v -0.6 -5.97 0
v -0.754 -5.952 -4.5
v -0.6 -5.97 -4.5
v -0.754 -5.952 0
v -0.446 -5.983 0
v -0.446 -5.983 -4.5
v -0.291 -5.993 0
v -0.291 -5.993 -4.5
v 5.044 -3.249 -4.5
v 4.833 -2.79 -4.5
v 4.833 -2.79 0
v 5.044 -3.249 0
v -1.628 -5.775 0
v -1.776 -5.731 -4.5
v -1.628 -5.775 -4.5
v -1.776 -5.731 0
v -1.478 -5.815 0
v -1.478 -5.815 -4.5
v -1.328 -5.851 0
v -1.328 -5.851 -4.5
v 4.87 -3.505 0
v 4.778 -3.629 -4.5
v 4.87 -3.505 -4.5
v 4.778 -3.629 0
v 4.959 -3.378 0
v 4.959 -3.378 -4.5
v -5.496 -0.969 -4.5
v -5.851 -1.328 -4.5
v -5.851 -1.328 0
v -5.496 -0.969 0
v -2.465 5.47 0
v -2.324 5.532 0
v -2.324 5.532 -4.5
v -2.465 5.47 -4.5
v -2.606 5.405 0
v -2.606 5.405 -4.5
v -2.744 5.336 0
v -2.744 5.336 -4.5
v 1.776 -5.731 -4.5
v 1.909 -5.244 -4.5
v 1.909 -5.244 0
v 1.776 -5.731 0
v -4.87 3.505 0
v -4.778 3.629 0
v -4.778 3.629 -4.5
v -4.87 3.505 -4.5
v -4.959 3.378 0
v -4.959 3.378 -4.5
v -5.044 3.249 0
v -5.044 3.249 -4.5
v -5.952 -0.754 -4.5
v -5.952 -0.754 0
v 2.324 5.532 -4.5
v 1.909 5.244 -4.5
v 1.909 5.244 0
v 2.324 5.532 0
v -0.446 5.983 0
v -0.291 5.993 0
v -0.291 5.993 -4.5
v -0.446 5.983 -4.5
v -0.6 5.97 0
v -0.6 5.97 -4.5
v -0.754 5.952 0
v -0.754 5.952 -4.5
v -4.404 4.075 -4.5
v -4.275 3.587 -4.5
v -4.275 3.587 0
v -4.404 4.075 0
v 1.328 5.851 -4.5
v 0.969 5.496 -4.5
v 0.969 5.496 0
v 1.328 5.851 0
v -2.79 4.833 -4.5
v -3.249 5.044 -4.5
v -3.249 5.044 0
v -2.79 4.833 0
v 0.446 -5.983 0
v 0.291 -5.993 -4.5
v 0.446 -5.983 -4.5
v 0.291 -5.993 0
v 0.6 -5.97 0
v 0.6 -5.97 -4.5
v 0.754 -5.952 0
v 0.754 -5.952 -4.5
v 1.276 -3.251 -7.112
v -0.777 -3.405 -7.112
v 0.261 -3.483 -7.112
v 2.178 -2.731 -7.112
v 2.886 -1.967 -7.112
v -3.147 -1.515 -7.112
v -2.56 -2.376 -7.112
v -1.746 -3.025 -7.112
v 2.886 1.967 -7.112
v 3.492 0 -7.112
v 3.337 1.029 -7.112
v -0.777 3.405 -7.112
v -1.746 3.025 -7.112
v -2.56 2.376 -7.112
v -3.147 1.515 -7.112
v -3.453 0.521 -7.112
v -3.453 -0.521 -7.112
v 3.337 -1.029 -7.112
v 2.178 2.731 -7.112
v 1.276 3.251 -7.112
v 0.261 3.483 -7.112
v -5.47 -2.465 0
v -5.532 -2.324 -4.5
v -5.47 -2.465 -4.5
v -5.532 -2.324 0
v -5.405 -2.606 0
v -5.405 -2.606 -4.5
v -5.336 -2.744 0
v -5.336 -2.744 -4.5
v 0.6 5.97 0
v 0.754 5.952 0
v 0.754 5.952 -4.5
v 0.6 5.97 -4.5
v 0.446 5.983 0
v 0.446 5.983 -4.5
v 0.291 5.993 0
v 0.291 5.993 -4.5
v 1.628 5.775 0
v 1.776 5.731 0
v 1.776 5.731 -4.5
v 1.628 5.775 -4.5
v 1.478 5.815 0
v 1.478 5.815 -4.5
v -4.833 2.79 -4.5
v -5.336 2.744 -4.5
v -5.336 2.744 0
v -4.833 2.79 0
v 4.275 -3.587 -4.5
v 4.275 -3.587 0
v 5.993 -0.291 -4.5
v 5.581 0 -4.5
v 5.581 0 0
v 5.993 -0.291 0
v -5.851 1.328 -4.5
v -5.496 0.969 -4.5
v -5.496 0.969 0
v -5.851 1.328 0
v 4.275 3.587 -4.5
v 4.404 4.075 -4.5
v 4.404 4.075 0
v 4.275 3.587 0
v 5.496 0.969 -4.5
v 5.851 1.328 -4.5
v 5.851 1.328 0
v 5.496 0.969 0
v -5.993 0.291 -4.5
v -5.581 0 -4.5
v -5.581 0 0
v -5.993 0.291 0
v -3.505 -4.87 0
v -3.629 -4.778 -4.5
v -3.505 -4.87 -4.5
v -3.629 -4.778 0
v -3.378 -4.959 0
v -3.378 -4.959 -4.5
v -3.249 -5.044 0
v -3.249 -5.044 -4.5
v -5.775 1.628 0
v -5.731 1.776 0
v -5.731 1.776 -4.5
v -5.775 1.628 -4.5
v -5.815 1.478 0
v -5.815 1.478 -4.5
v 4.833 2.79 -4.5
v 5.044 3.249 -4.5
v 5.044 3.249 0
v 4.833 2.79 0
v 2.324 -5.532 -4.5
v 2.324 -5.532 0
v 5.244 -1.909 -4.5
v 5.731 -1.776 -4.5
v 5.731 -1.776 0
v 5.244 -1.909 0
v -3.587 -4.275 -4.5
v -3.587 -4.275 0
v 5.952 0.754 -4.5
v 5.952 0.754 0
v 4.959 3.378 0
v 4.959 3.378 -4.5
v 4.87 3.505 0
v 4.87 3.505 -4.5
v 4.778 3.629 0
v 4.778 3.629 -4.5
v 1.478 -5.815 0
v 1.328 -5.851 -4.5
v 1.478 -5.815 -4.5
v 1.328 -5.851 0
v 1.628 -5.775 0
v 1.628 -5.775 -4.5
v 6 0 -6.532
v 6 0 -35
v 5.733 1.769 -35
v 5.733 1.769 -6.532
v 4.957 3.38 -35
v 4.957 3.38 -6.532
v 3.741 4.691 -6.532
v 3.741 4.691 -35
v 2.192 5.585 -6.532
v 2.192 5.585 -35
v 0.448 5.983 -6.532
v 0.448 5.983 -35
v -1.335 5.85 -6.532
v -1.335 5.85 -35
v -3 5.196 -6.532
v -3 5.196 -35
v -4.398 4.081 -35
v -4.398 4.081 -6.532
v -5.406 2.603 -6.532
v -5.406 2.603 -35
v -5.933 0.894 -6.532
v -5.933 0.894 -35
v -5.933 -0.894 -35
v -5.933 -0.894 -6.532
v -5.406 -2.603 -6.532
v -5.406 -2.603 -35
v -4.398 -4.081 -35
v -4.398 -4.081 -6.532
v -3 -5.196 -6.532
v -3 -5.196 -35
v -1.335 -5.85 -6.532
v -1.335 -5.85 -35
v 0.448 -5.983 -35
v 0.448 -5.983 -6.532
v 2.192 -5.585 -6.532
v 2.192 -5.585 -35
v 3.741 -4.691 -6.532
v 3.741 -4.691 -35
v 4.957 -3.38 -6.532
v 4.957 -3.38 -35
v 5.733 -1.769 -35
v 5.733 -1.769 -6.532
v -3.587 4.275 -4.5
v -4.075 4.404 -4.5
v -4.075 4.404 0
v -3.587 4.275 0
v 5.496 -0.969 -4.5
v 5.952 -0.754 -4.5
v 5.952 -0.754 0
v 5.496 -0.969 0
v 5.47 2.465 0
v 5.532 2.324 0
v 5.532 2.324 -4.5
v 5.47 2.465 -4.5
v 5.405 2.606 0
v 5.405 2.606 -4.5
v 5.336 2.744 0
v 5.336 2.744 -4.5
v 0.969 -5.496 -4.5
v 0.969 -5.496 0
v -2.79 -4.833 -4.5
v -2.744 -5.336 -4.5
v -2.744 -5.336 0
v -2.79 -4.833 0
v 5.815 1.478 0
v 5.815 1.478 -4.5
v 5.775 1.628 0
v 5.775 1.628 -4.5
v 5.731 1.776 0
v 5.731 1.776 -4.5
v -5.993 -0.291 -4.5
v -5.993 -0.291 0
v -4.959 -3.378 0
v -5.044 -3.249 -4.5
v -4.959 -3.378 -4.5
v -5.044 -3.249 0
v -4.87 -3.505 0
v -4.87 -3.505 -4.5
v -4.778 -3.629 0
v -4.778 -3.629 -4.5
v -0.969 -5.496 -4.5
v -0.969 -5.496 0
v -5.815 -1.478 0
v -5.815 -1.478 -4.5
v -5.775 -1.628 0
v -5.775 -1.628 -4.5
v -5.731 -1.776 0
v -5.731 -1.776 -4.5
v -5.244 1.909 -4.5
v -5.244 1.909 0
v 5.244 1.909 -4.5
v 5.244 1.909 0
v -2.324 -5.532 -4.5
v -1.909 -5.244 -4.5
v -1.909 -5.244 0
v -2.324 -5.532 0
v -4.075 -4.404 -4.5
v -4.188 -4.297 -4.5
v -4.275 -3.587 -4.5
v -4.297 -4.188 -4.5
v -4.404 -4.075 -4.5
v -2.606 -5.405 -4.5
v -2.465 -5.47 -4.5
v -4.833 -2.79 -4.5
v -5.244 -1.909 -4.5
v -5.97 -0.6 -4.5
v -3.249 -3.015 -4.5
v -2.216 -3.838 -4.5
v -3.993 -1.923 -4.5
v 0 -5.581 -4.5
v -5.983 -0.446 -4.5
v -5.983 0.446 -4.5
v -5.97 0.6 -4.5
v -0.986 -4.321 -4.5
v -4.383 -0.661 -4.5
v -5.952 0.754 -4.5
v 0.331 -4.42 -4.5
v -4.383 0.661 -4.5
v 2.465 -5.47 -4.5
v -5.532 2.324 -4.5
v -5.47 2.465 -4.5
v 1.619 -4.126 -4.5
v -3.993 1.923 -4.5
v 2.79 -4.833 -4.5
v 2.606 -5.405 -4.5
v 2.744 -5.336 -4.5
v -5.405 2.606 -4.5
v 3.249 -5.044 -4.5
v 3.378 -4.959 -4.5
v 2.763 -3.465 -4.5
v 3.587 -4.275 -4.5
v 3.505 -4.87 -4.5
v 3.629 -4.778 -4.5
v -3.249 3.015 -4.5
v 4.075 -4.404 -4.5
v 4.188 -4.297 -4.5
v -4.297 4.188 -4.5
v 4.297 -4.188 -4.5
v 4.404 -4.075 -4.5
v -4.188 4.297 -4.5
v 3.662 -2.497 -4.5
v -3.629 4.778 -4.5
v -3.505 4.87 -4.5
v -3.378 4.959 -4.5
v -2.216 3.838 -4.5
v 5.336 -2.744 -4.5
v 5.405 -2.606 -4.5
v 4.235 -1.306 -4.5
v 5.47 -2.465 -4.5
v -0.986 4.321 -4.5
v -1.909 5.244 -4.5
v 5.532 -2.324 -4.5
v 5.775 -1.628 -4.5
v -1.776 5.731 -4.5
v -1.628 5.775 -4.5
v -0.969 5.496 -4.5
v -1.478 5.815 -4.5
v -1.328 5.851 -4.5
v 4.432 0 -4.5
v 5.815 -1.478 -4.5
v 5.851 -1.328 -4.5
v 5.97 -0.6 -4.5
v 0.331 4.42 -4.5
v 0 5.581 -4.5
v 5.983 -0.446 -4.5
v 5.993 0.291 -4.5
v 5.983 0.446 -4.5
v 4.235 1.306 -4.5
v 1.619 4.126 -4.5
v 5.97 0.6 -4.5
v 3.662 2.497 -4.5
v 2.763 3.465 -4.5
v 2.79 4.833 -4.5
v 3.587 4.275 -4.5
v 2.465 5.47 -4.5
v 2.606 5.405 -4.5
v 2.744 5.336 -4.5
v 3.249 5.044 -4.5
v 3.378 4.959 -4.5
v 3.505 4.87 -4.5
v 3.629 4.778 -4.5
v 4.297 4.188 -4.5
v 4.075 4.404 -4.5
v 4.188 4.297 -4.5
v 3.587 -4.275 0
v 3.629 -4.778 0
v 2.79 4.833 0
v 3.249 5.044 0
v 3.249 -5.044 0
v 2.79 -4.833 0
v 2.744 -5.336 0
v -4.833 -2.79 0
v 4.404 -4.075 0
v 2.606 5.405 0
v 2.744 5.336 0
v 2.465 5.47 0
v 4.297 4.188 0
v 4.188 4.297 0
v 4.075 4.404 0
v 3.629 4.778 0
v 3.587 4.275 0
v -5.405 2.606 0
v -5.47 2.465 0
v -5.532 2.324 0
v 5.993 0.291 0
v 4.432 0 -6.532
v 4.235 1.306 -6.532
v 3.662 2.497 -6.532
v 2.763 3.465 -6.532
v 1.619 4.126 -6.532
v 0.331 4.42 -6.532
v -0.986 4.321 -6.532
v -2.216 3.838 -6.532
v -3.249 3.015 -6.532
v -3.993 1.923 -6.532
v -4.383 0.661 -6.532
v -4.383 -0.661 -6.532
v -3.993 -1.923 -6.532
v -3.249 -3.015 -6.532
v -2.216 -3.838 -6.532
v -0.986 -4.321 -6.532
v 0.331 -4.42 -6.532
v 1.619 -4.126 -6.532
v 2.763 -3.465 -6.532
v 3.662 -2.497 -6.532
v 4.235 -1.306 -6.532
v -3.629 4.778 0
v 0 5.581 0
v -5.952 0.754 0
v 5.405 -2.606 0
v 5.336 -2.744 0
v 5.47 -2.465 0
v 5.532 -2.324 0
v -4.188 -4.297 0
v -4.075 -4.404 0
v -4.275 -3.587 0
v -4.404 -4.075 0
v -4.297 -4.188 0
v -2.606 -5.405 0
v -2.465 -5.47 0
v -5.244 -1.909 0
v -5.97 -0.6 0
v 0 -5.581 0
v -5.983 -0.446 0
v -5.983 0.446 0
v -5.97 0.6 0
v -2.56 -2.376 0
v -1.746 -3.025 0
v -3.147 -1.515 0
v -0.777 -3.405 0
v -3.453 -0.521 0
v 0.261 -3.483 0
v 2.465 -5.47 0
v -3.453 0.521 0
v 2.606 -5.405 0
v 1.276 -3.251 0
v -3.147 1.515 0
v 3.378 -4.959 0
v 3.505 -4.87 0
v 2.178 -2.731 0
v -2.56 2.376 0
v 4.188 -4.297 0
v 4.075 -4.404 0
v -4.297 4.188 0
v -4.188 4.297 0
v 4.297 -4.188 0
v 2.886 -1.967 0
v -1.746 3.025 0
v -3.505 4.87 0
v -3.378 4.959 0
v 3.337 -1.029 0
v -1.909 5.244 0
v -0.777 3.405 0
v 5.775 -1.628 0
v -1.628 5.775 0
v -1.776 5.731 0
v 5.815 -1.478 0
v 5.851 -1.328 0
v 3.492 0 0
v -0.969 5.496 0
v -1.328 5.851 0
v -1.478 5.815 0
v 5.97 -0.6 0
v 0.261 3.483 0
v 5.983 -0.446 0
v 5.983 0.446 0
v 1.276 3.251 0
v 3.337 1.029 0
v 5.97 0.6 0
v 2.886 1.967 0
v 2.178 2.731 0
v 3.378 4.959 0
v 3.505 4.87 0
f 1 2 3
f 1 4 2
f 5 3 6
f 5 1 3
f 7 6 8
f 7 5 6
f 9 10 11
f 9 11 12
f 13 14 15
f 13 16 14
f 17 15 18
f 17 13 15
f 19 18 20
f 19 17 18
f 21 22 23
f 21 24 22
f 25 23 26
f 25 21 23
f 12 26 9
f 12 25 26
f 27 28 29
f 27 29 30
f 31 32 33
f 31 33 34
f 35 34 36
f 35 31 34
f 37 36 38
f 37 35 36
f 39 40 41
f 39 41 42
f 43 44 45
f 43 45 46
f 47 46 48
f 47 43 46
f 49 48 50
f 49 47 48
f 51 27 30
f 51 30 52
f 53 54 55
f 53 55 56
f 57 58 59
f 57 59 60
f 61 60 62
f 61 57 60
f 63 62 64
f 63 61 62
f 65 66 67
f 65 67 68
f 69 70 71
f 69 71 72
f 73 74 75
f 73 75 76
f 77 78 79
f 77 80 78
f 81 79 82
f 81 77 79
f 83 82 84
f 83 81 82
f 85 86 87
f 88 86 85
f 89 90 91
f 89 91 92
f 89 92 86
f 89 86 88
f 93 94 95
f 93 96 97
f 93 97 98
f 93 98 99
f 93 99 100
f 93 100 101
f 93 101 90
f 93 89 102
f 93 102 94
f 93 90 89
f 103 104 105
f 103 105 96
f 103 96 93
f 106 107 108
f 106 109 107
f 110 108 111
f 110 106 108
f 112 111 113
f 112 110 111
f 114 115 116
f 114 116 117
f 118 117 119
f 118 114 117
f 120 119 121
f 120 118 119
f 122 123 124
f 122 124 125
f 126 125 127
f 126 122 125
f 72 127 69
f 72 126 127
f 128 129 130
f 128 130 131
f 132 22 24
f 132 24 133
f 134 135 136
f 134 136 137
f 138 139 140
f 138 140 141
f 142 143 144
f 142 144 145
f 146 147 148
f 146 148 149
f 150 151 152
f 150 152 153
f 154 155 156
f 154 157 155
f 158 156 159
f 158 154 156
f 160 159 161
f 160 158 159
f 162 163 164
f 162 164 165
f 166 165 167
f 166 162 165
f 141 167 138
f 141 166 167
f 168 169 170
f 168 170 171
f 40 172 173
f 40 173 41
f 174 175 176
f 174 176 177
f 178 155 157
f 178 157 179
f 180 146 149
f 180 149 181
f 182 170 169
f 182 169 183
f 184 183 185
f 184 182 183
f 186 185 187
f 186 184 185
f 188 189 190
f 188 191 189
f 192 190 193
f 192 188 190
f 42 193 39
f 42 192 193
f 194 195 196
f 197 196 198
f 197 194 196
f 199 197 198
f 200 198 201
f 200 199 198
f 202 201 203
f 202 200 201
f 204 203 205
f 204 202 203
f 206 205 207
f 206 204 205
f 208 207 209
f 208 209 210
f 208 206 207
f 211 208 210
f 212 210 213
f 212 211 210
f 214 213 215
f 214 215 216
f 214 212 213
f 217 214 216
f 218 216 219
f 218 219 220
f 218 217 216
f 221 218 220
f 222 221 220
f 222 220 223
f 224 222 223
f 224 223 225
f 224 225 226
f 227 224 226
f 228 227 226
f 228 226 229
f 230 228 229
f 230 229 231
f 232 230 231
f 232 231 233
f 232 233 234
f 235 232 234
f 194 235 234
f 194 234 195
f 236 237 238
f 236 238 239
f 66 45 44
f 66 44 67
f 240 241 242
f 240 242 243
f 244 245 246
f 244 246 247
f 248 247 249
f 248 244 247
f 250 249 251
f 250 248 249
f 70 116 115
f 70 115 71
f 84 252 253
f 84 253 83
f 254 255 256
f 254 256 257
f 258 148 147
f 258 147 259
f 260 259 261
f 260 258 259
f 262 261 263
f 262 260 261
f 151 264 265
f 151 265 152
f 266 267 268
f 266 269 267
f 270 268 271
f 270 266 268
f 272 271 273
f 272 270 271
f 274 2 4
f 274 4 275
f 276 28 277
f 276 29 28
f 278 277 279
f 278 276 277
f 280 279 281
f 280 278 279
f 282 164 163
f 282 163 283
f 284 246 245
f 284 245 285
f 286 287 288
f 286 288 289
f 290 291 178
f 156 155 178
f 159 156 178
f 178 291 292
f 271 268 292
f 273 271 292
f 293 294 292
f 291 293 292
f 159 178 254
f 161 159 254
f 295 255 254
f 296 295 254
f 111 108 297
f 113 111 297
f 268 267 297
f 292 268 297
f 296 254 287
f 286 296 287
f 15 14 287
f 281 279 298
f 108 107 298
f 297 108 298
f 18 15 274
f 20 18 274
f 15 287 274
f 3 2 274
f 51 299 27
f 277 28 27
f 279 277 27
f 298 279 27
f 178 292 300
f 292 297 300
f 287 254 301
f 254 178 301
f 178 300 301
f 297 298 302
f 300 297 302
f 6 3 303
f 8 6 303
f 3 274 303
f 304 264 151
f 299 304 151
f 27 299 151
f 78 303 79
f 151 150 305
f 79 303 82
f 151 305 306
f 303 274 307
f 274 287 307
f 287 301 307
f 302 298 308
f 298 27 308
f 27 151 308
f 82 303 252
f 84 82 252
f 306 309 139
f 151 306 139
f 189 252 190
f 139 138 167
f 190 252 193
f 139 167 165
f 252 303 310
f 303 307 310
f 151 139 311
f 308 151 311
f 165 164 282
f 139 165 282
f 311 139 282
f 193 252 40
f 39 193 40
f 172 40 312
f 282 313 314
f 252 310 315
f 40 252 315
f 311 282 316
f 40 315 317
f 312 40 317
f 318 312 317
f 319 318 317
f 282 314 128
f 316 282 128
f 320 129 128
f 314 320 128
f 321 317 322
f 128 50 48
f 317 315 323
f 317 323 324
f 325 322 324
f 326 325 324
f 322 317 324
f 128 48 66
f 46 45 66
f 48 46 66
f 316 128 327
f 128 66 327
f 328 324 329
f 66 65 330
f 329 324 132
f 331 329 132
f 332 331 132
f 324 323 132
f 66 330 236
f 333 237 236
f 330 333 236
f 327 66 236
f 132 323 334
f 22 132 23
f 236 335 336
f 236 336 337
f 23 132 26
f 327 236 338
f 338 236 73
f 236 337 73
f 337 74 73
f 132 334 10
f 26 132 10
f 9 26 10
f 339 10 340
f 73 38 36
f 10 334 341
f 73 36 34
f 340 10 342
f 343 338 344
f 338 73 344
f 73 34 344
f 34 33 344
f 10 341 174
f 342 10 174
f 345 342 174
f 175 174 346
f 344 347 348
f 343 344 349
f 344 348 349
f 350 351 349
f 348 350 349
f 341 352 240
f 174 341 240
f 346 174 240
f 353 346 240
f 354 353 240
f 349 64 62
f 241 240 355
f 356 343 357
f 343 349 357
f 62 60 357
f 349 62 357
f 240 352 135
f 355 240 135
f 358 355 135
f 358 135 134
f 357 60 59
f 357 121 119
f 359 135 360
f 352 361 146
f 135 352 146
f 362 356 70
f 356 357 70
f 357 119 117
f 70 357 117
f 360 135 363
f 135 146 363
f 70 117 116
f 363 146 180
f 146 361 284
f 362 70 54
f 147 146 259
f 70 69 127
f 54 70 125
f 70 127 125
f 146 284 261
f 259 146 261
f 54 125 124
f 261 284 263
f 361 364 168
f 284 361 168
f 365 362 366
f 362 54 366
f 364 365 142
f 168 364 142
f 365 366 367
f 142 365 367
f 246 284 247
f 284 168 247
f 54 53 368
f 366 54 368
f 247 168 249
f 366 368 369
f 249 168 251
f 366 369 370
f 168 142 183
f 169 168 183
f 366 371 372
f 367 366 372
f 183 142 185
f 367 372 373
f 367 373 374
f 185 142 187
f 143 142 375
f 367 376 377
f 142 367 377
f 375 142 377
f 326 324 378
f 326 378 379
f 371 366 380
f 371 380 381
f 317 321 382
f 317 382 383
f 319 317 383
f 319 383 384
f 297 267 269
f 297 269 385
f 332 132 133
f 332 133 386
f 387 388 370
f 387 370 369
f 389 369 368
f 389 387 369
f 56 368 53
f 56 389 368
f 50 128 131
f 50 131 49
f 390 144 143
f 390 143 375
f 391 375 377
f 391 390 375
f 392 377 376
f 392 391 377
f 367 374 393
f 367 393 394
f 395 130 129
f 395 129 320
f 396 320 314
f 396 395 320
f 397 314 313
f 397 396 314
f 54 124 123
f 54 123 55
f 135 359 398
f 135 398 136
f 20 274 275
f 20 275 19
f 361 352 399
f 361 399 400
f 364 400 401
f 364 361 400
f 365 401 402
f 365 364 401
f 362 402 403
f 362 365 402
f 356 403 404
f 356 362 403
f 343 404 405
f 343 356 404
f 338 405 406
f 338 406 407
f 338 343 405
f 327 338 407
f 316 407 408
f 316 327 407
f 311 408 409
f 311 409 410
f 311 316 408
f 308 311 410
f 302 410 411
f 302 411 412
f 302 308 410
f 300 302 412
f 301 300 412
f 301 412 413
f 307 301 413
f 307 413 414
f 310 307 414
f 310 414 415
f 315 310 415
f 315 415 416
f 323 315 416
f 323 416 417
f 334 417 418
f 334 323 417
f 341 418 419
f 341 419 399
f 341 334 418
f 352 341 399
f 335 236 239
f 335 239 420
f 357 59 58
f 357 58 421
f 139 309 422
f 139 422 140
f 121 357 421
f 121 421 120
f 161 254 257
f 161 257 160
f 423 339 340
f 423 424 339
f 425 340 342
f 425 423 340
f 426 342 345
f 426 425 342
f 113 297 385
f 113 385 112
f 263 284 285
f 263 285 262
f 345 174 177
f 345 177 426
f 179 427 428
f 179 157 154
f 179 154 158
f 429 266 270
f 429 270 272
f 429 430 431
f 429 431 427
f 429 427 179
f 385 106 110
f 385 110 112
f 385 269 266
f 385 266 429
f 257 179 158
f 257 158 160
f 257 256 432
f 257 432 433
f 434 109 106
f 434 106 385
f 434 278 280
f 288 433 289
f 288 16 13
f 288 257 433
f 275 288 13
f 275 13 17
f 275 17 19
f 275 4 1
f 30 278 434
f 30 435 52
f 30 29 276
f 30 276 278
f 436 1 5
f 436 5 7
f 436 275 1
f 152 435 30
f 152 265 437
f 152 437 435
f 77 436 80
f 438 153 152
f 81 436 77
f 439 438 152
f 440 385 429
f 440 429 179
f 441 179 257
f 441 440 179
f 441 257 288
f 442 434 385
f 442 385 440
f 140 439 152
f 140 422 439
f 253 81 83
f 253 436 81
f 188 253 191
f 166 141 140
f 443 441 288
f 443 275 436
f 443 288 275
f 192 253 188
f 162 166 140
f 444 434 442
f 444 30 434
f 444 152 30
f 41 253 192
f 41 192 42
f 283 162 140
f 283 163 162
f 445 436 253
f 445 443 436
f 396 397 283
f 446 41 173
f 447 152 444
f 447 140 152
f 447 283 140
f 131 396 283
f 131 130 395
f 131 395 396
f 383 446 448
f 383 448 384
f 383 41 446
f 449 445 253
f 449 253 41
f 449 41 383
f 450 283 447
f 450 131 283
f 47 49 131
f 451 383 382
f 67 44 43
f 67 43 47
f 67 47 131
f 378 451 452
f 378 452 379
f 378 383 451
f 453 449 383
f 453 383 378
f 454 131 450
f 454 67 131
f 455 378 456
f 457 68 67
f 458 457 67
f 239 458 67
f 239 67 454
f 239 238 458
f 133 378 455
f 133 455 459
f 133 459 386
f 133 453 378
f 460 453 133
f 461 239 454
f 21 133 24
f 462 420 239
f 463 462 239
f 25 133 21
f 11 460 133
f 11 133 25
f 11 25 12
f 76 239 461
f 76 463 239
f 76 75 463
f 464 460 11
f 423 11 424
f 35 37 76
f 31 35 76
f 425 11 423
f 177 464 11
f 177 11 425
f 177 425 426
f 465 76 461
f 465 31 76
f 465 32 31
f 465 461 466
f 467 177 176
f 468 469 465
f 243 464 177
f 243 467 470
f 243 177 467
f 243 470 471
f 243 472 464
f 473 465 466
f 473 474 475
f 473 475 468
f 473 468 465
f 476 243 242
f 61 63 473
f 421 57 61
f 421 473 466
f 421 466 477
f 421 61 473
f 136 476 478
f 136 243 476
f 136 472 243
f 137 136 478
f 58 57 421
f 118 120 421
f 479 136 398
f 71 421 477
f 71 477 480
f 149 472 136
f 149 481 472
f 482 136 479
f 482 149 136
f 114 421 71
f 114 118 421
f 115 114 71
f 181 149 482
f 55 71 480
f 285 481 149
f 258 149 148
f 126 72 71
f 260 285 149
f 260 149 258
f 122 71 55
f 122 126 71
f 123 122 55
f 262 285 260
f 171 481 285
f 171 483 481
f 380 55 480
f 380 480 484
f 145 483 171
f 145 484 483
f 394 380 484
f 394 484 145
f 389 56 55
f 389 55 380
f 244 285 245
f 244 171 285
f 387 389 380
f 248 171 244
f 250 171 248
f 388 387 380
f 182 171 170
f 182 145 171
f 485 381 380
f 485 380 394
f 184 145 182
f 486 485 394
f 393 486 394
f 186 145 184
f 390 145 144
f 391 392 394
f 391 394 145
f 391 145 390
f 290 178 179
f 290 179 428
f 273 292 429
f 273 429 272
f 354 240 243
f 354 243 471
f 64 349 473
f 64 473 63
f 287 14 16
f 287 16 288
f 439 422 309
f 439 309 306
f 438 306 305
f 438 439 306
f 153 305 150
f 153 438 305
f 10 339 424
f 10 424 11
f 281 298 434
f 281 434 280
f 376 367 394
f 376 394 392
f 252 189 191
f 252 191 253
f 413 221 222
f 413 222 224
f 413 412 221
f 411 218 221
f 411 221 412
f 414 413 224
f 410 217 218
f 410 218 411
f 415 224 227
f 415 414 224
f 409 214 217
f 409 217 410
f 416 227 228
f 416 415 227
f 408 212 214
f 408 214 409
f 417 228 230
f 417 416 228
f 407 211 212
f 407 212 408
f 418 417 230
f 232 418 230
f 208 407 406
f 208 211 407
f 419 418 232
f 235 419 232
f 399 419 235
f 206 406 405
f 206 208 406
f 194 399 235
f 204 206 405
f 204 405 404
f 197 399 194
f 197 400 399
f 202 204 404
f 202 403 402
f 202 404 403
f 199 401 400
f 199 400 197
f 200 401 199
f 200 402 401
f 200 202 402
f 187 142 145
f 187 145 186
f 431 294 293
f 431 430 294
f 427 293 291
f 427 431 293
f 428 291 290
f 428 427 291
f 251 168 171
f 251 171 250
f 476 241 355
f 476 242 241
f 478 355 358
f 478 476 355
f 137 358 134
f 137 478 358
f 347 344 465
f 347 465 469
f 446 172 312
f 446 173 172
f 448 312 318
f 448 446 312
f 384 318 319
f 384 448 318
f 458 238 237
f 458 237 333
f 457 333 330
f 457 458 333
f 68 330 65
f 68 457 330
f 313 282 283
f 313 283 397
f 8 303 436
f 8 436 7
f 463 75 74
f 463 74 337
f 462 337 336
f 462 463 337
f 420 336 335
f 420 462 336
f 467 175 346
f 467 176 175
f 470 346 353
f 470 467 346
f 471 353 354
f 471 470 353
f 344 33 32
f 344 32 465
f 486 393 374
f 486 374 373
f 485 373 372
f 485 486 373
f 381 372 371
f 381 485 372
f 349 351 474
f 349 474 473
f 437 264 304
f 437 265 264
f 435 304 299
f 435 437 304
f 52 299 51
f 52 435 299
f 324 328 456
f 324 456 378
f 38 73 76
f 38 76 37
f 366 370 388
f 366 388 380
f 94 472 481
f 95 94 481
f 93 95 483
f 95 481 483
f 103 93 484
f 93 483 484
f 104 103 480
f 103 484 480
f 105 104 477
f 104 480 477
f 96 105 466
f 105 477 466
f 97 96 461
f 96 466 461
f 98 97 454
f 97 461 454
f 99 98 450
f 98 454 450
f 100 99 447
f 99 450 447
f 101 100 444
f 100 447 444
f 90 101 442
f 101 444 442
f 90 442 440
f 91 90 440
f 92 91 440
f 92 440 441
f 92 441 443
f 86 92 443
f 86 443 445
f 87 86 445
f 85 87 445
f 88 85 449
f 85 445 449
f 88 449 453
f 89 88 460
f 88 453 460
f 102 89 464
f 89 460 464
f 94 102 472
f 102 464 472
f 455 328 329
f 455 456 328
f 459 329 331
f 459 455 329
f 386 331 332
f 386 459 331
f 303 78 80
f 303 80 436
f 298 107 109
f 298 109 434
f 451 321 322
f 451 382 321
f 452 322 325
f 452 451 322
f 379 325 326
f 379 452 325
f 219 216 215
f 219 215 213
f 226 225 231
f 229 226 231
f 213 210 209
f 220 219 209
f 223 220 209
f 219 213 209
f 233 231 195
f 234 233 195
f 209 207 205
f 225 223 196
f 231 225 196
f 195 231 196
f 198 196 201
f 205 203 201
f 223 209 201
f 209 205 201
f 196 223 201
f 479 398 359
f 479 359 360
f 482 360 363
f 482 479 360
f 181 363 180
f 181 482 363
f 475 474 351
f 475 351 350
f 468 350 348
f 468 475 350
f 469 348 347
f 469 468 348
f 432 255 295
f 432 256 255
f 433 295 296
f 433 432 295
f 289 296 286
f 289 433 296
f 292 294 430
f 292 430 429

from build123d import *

# Parameters (mm, degrees)
SKETCH1_R           = 6
BOSS_EXTRUDE1_DEPTH = 35
SKETCH4_OUTSIDE_W   = 21.78
SKETCH4_OUTSIDE_H   = 21.78
CUT_EXTRUDE5_DEPTH  = 4.5
SKETCH6_R           = 6.880488524
SKETCH6_R_2         = 4.4323
CUT_EXTRUDE6_DEPTH  = 2.032
SKETCH7_R           = 3.4925
CUT_EXTRUDE7_DEPTH  = 7.112


with BuildPart() as part:
    # Sketch1 → Boss-Extrude1 (new body)
    with BuildSketch(Plane.XY):
        Circle(SKETCH1_R)
    extrude(amount=-BOSS_EXTRUDE1_DEPTH)

    # Sketch4 outside → Cut-Extrude5 (cut)
    with BuildSketch(Plane.XY):
        Rectangle(SKETCH4_OUTSIDE_W, SKETCH4_OUTSIDE_H)
        with BuildLine():
            Line((5.5808372, 0), (5.992919203, 0.291409379))
            ThreePointArc((5.992919203, 0.291409379), (5.977168189, 0.522934456), (5.952476002, 0.753677283))
            Line((5.952476002, 0.753677283), (5.496051743, 0.96910221))
            Line((5.496051743, 0.96910221), (5.851270587, 1.327641714))
            ThreePointArc((5.851270587, 1.327641714), (5.795554958, 1.552914271), (5.73116983, 1.775863842))
            Line((5.73116983, 1.775863842), (5.244271535, 1.908758739))
            Line((5.244271535, 1.908758739), (5.531834074, 2.323534328))
            ThreePointArc((5.531834074, 2.323534328), (5.437846722, 2.53570957), (5.335724962, 2.744091676))
            Line((5.335724962, 2.744091676), (4.83314679, 2.7904186))
            Line((4.83314679, 2.7904186), (5.044315583, 3.248827527))
            ThreePointArc((5.044315583, 3.248827527), (4.914912266, 3.441458618), (4.778156792, 3.628941674))
            Line((4.778156792, 3.628941674), (4.275169325, 3.587293004))
            Line((4.275169325, 3.587293004), (4.403528115, 4.075406745))
            ThreePointArc((4.403528115, 4.075406745), (4.242640687, 4.242640687), (4.075406745, 4.403528115))
            Line((4.075406745, 4.403528115), (3.587293004, 4.275169325))
            Line((3.587293004, 4.275169325), (3.628941674, 4.778156792))
            ThreePointArc((3.628941674, 4.778156792), (3.441458618, 4.914912266), (3.248827527, 5.044315583))
            Line((3.248827527, 5.044315583), (2.7904186, 4.83314679))
            Line((2.7904186, 4.83314679), (2.744091676, 5.335724962))
            ThreePointArc((2.744091676, 5.335724962), (2.53570957, 5.437846722), (2.323534328, 5.531834074))
            Line((2.323534328, 5.531834074), (1.908758739, 5.244271535))
            Line((1.908758739, 5.244271535), (1.775863842, 5.73116983))
            ThreePointArc((1.775863842, 5.73116983), (1.552914271, 5.795554958), (1.327641714, 5.851270587))
            Line((1.327641714, 5.851270587), (0.96910221, 5.496051743))
            Line((0.96910221, 5.496051743), (0.753677283, 5.952476002))
            ThreePointArc((0.753677283, 5.952476002), (0.522934456, 5.977168189), (0.291409379, 5.992919203))
            Line((0.291409379, 5.992919203), (0, 5.5808372))
            Line((0, 5.5808372), (-0.291409379, 5.992919203))
            ThreePointArc((-0.291409379, 5.992919203), (-0.522934456, 5.977168189), (-0.753677283, 5.952476002))
            Line((-0.753677283, 5.952476002), (-0.96910221, 5.496051743))
            Line((-0.96910221, 5.496051743), (-1.327641714, 5.851270587))
            ThreePointArc((-1.327641714, 5.851270587), (-1.552914271, 5.795554958), (-1.775863842, 5.73116983))
            Line((-1.775863842, 5.73116983), (-1.908758739, 5.244271535))
            Line((-1.908758739, 5.244271535), (-2.323534328, 5.531834074))
            ThreePointArc((-2.323534328, 5.531834074), (-2.53570957, 5.437846722), (-2.744091676, 5.335724962))
            Line((-2.744091676, 5.335724962), (-2.7904186, 4.83314679))
            Line((-2.7904186, 4.83314679), (-3.248827527, 5.044315583))
            ThreePointArc((-3.248827527, 5.044315583), (-3.441458618, 4.914912266), (-3.628941674, 4.778156792))
            Line((-3.628941674, 4.778156792), (-3.587293004, 4.275169325))
            Line((-3.587293004, 4.275169325), (-4.075406745, 4.403528115))
            ThreePointArc((-4.075406745, 4.403528115), (-4.242640687, 4.242640687), (-4.403528115, 4.075406745))
            Line((-4.403528115, 4.075406745), (-4.275169325, 3.587293004))
            Line((-4.275169325, 3.587293004), (-4.778156792, 3.628941674))
            ThreePointArc((-4.778156792, 3.628941674), (-4.914912266, 3.441458618), (-5.044315583, 3.248827527))
            Line((-5.044315583, 3.248827527), (-4.83314679, 2.7904186))
            Line((-4.83314679, 2.7904186), (-5.335724962, 2.744091676))
            ThreePointArc((-5.335724962, 2.744091676), (-5.437846722, 2.53570957), (-5.531834074, 2.323534328))
            Line((-5.531834074, 2.323534328), (-5.244271535, 1.908758739))
            Line((-5.244271535, 1.908758739), (-5.73116983, 1.775863842))
            ThreePointArc((-5.73116983, 1.775863842), (-5.795554958, 1.552914271), (-5.851270587, 1.327641714))
            Line((-5.851270587, 1.327641714), (-5.496051743, 0.96910221))
            Line((-5.496051743, 0.96910221), (-5.952476002, 0.753677283))
            ThreePointArc((-5.952476002, 0.753677283), (-5.977168189, 0.522934456), (-5.992919203, 0.291409379))
            Line((-5.992919203, 0.291409379), (-5.5808372, 0))
            Line((-5.5808372, 0), (-5.992919203, -0.291409379))
            ThreePointArc((-5.992919203, -0.291409379), (-5.977168189, -0.522934456), (-5.952476002, -0.753677283))
            Line((-5.952476002, -0.753677283), (-5.496051743, -0.96910221))
            Line((-5.496051743, -0.96910221), (-5.851270587, -1.327641714))
            ThreePointArc((-5.851270587, -1.327641714), (-5.795554958, -1.552914271), (-5.73116983, -1.775863842))
            Line((-5.73116983, -1.775863842), (-5.244271535, -1.908758739))
            Line((-5.244271535, -1.908758739), (-5.531834074, -2.323534328))
            ThreePointArc((-5.531834074, -2.323534328), (-5.437846722, -2.53570957), (-5.335724962, -2.744091676))
            Line((-5.335724962, -2.744091676), (-4.83314679, -2.7904186))
            Line((-4.83314679, -2.7904186), (-5.044315583, -3.248827527))
            ThreePointArc((-5.044315583, -3.248827527), (-4.914912266, -3.441458618), (-4.778156792, -3.628941674))
            Line((-4.778156792, -3.628941674), (-4.275169325, -3.587293004))
            Line((-4.275169325, -3.587293004), (-4.403528115, -4.075406745))
            ThreePointArc((-4.403528115, -4.075406745), (-4.242640687, -4.242640687), (-4.075406745, -4.403528115))
            Line((-4.075406745, -4.403528115), (-3.587293004, -4.275169325))
            Line((-3.587293004, -4.275169325), (-3.628941674, -4.778156792))
            ThreePointArc((-3.628941674, -4.778156792), (-3.441458618, -4.914912266), (-3.248827527, -5.044315583))
            Line((-3.248827527, -5.044315583), (-2.7904186, -4.83314679))
            Line((-2.7904186, -4.83314679), (-2.744091676, -5.335724962))
            ThreePointArc((-2.744091676, -5.335724962), (-2.53570957, -5.437846722), (-2.323534328, -5.531834074))
            Line((-2.323534328, -5.531834074), (-1.908758739, -5.244271535))
            Line((-1.908758739, -5.244271535), (-1.775863842, -5.73116983))
            ThreePointArc((-1.775863842, -5.73116983), (-1.552914271, -5.795554958), (-1.327641714, -5.851270587))
            Line((-1.327641714, -5.851270587), (-0.96910221, -5.496051743))
            Line((-0.96910221, -5.496051743), (-0.753677283, -5.952476002))
            ThreePointArc((-0.753677283, -5.952476002), (-0.522934456, -5.977168189), (-0.291409379, -5.992919203))
            Line((-0.291409379, -5.992919203), (0, -5.5808372))
            Line((0, -5.5808372), (0.291409379, -5.992919203))
            ThreePointArc((0.291409379, -5.992919203), (0.522934456, -5.977168189), (0.753677283, -5.952476002))
            Line((0.753677283, -5.952476002), (0.96910221, -5.496051743))
            Line((0.96910221, -5.496051743), (1.327641714, -5.851270587))
            ThreePointArc((1.327641714, -5.851270587), (1.552914271, -5.795554958), (1.775863842, -5.73116983))
            Line((1.775863842, -5.73116983), (1.908758739, -5.244271535))
            Line((1.908758739, -5.244271535), (2.323534328, -5.531834074))
            ThreePointArc((2.323534328, -5.531834074), (2.53570957, -5.437846722), (2.744091676, -5.335724962))
            Line((2.744091676, -5.335724962), (2.7904186, -4.83314679))
            Line((2.7904186, -4.83314679), (3.248827527, -5.044315583))
            ThreePointArc((3.248827527, -5.044315583), (3.441458618, -4.914912266), (3.628941674, -4.778156792))
            Line((3.628941674, -4.778156792), (3.587293004, -4.275169325))
            Line((3.587293004, -4.275169325), (4.075406745, -4.403528115))
            ThreePointArc((4.075406745, -4.403528115), (4.242640687, -4.242640687), (4.403528115, -4.075406745))
            Line((4.403528115, -4.075406745), (4.275169325, -3.587293004))
            Line((4.275169325, -3.587293004), (4.778156792, -3.628941674))
            ThreePointArc((4.778156792, -3.628941674), (4.914912266, -3.441458618), (5.044315583, -3.248827527))
            Line((5.044315583, -3.248827527), (4.83314679, -2.7904186))
            Line((4.83314679, -2.7904186), (5.335724962, -2.744091676))
            ThreePointArc((5.335724962, -2.744091676), (5.437846722, -2.53570957), (5.531834074, -2.323534328))
            Line((5.531834074, -2.323534328), (5.244271535, -1.908758739))
            Line((5.244271535, -1.908758739), (5.73116983, -1.775863842))
            ThreePointArc((5.73116983, -1.775863842), (5.795554958, -1.552914271), (5.851270587, -1.327641714))
            Line((5.851270587, -1.327641714), (5.496051743, -0.96910221))
            Line((5.496051743, -0.96910221), (5.952476002, -0.753677283))
            ThreePointArc((5.952476002, -0.753677283), (5.977168189, -0.522934456), (5.992919203, -0.291409379))
            Line((5.992919203, -0.291409379), (5.5808372, 0))
        make_face(mode=Mode.SUBTRACT)
    extrude(amount=-CUT_EXTRUDE5_DEPTH, mode=Mode.SUBTRACT)

    # Sketch6 → Cut-Extrude6 (cut)
    with BuildSketch(Plane.XY.offset(-4.5)):
        Circle(SKETCH6_R)
        Circle(SKETCH6_R_2, mode=Mode.SUBTRACT)
    extrude(amount=-CUT_EXTRUDE6_DEPTH, mode=Mode.SUBTRACT)

    # Sketch7 → Cut-Extrude7 (cut)
    with BuildSketch(Plane.XY):
        Circle(SKETCH7_R)
    extrude(amount=-CUT_EXTRUDE7_DEPTH, mode=Mode.SUBTRACT)


solid = part.part
